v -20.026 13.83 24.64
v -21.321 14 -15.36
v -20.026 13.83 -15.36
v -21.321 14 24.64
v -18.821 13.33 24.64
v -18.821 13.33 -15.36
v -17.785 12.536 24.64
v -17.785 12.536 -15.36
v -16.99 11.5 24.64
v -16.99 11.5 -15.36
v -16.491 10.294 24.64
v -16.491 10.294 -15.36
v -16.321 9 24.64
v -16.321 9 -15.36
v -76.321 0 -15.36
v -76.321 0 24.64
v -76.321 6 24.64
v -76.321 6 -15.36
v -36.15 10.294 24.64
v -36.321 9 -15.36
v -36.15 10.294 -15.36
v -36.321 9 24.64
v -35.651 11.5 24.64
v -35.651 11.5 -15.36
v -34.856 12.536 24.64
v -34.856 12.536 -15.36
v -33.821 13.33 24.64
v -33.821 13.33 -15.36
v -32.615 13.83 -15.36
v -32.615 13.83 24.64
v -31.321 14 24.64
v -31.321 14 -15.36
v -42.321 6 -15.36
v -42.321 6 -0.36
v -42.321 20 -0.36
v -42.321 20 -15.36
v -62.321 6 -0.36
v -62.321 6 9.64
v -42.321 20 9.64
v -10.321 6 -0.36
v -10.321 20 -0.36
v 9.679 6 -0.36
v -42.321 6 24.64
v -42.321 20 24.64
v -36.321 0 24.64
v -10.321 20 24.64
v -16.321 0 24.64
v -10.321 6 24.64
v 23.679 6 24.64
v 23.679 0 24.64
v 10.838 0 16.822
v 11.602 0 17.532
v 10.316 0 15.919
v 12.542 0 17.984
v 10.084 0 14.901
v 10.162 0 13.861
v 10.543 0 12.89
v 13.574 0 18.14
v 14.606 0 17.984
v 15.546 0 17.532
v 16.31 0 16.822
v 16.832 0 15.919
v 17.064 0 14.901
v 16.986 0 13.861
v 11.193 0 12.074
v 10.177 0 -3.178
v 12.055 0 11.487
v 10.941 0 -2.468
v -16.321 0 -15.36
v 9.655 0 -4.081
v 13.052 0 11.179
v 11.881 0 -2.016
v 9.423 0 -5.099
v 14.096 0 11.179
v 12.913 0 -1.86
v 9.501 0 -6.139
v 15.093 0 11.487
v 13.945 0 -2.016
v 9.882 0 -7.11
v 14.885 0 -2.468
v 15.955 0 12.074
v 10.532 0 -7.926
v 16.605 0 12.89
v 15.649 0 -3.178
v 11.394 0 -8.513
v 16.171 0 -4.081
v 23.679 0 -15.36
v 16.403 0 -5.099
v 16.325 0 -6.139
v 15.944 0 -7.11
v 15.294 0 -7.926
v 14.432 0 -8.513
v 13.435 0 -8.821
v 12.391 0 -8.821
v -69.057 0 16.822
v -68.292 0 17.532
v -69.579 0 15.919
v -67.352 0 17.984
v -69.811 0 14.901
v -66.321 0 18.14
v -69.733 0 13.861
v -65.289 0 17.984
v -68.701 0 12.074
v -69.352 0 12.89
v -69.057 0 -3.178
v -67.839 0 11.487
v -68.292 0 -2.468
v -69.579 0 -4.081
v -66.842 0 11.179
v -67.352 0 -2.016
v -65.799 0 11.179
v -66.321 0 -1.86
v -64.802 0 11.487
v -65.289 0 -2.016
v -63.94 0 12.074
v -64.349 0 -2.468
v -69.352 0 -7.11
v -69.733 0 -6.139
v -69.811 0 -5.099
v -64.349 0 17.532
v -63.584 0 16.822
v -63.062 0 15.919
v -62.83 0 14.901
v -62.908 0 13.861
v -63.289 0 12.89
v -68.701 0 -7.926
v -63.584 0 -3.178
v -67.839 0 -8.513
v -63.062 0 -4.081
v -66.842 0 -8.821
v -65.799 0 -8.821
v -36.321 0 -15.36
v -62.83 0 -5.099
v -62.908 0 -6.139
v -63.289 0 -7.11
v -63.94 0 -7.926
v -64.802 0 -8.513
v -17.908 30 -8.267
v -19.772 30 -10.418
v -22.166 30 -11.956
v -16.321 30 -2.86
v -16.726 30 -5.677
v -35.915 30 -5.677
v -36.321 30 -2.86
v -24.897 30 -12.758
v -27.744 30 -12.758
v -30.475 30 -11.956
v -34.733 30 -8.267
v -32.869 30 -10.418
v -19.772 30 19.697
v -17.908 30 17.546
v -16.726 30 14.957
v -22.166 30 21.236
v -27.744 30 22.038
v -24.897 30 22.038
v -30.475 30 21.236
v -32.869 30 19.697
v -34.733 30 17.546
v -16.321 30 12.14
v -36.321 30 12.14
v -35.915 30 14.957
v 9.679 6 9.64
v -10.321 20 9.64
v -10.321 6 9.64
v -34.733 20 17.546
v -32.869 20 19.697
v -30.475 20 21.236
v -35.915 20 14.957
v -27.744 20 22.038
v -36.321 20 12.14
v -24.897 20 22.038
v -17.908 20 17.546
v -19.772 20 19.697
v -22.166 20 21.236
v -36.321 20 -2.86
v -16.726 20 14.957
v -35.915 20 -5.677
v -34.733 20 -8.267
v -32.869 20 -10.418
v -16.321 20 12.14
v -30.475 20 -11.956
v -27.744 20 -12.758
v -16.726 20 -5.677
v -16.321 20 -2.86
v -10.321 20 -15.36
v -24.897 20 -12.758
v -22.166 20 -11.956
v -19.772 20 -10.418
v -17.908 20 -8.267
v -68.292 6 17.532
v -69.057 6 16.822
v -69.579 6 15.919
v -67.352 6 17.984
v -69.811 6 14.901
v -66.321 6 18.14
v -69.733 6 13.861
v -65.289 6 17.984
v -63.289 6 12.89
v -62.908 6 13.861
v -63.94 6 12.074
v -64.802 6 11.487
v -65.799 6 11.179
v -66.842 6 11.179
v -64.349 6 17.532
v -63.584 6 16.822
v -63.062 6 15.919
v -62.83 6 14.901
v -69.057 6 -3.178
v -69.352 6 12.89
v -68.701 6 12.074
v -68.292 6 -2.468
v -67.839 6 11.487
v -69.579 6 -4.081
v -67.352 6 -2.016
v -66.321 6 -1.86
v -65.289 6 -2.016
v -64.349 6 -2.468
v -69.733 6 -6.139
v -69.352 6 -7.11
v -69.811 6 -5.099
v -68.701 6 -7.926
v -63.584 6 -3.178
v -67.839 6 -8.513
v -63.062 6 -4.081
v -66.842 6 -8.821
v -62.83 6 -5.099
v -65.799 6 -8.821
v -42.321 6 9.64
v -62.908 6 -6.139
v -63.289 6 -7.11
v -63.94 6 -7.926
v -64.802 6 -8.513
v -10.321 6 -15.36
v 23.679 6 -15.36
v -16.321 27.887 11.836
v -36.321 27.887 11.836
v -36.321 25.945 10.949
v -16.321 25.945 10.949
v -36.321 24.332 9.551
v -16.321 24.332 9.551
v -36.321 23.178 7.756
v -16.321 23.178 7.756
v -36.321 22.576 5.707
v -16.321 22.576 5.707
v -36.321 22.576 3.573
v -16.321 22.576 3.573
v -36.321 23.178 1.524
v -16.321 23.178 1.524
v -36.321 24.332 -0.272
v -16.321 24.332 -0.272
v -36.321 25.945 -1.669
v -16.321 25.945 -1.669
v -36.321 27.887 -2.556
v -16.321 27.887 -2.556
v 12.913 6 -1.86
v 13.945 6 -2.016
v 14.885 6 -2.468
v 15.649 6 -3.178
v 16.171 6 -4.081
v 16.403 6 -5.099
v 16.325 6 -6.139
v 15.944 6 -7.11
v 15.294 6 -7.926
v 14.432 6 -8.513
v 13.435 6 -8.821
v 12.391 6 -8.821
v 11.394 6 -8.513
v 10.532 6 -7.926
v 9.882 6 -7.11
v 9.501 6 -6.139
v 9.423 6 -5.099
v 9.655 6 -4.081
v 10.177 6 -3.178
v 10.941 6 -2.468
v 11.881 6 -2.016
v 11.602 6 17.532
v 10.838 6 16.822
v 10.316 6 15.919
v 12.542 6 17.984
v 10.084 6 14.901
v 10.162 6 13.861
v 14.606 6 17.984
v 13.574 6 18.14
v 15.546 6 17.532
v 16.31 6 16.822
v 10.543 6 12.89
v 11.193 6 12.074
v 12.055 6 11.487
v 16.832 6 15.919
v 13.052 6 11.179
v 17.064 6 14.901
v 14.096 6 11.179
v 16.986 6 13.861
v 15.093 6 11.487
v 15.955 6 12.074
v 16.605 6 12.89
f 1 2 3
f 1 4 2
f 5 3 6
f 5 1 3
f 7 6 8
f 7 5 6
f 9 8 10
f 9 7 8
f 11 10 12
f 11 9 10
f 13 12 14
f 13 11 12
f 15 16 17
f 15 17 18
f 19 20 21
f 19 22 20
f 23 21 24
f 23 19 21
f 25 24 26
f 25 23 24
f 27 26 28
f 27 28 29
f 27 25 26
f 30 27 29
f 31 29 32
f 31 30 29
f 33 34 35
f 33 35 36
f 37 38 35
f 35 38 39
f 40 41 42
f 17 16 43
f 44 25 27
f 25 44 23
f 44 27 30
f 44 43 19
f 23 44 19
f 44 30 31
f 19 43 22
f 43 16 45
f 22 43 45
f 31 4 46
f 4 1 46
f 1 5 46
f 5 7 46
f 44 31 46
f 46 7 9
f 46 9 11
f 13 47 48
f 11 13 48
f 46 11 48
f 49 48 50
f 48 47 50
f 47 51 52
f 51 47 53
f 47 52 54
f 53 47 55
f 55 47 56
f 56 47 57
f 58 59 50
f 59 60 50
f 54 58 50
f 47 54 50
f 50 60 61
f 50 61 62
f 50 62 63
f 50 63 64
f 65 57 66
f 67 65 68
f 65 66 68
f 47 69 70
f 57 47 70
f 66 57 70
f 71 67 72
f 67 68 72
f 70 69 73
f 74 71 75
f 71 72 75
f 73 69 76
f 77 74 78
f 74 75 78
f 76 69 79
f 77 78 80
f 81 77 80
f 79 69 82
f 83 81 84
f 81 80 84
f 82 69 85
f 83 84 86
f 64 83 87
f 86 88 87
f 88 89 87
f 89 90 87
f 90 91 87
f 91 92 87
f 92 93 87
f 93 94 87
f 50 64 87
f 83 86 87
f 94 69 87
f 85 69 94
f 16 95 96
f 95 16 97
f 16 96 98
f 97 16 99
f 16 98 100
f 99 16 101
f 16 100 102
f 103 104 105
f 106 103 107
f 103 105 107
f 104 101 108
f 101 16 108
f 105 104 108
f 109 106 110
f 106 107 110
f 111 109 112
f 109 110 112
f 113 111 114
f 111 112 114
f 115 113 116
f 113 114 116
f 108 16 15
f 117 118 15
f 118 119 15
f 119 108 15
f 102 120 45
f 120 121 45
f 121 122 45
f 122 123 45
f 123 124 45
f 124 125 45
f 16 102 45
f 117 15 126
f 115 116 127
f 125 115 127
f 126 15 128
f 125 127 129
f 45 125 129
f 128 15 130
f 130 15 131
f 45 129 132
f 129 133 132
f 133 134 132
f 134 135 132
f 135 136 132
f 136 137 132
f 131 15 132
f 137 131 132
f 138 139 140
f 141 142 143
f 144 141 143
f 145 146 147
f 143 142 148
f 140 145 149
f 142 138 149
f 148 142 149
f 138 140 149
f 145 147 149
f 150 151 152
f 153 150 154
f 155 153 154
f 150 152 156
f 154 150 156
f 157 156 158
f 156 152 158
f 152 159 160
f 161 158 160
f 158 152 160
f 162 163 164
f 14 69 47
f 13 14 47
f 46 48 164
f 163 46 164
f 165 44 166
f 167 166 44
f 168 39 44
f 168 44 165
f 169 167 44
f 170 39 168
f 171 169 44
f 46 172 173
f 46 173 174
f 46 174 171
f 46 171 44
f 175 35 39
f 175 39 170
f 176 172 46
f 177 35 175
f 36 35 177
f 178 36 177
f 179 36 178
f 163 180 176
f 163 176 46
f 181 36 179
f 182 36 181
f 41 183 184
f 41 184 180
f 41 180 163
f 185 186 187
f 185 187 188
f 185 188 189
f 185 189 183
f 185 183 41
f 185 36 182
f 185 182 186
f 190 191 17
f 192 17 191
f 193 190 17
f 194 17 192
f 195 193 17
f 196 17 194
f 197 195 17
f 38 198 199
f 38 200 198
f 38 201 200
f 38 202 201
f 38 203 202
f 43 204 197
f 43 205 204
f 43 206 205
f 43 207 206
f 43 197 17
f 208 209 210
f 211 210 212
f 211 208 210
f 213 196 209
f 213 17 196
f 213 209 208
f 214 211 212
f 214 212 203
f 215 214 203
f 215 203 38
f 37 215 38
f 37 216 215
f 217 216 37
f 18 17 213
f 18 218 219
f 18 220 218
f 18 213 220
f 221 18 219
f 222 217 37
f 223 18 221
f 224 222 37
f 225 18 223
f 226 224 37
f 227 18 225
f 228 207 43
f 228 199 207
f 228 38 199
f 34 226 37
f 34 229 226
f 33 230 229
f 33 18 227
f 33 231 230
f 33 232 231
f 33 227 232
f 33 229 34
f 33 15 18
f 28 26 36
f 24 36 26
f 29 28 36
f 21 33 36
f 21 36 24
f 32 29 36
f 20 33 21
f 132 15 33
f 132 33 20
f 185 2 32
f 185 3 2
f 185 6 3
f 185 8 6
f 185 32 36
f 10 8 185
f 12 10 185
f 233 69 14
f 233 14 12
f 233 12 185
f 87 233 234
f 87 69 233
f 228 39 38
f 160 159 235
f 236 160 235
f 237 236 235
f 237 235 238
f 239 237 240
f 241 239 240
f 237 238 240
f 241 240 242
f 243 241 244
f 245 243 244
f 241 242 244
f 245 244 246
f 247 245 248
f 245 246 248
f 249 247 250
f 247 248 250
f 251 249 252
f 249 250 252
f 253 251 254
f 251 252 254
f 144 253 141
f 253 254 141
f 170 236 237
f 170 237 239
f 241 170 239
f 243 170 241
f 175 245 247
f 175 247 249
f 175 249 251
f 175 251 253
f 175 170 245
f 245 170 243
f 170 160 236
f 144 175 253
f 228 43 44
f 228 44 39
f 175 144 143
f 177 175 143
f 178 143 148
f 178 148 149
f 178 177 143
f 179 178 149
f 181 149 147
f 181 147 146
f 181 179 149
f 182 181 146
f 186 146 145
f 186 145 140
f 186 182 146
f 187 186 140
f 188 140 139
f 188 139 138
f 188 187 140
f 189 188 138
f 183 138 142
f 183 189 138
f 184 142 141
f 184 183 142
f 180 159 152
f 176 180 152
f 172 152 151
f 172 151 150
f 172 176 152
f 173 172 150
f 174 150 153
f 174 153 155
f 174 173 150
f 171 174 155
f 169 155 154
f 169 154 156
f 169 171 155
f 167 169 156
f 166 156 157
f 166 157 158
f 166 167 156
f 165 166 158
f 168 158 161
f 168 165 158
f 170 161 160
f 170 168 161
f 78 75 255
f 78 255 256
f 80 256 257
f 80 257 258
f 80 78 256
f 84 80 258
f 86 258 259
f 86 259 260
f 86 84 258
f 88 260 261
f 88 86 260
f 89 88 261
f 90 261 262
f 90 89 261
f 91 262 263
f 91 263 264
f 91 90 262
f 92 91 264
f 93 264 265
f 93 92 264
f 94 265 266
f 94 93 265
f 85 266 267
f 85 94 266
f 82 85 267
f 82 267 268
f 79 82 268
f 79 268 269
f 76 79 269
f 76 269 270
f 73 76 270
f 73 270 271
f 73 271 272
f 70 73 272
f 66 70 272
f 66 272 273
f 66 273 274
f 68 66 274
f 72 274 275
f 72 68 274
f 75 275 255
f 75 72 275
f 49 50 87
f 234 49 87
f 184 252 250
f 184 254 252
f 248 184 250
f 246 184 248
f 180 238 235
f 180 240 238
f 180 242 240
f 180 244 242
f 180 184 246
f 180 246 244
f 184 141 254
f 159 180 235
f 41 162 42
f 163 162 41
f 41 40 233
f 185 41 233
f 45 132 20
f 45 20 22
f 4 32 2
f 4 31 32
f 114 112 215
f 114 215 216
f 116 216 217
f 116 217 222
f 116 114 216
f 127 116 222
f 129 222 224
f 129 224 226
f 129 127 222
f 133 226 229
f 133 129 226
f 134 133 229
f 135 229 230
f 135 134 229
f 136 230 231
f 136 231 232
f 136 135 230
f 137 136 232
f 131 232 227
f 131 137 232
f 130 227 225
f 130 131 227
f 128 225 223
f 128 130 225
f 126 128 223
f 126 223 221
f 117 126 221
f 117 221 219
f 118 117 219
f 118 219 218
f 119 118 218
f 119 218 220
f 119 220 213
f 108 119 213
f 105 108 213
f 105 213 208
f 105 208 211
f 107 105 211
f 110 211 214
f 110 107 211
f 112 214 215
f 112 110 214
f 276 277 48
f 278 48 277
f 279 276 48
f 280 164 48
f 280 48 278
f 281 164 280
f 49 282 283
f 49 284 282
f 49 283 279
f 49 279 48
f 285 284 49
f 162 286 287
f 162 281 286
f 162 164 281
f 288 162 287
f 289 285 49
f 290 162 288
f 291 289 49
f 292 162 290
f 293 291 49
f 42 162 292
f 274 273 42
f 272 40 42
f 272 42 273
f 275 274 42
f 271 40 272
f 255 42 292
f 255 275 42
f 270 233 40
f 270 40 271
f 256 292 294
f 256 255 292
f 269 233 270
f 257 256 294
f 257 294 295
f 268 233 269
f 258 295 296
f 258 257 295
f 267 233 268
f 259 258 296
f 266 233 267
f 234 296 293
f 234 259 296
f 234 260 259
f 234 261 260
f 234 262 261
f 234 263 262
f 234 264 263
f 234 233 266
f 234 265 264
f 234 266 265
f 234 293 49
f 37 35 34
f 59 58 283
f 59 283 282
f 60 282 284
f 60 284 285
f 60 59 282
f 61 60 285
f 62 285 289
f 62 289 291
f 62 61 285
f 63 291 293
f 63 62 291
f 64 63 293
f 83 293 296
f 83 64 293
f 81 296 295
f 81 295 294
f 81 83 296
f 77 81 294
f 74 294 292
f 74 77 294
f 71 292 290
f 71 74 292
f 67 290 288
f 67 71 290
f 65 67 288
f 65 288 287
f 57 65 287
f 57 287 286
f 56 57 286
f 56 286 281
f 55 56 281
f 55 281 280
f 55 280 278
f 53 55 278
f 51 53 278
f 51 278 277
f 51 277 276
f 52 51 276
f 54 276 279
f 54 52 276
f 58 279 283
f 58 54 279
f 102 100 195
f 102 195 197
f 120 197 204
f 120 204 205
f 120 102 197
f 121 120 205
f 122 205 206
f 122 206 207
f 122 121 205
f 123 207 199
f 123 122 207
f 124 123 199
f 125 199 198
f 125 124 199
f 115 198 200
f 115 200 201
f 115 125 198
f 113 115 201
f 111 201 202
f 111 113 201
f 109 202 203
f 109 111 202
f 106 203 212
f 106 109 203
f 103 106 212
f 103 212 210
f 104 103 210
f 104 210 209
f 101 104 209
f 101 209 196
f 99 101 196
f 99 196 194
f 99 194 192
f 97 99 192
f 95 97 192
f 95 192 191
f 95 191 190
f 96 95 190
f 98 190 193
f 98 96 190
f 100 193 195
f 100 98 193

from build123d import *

# Parameters (mm, degrees)
SKETCH1_W           = 100
SKETCH1_H           = 40
SKETCH1_R           = 3.5
BOSS_EXTRUDE1_DEPTH = 6
SKETCH2_W           = 32
SKETCH2_H           = 40
BOSS_EXTRUDE2_DEPTH = 14
SKETCH3_W           = 20
SKETCH3_H           = 40
CUT_EXTRUDE1_DEPTH  = 14
FILLET2_R           = 5
FILLET3_R           = 5
BOSS_EXTRUDE3_DEPTH = 10
BOSS_EXTRUDE4_DEPTH = 10
SKETCH8_R           = 7.5
CUT_EXTRUDE2_DEPTH  = 29


with BuildPart() as part:
    # Sketch1 → Boss-Extrude1 (new body)
    with BuildSketch(Plane(origin=(0, 0, 0), x_dir=(1, 0, 0), z_dir=(0, 1, 0))):
        with Locations((-26.320522258, -4.639903709)):
            Rectangle(SKETCH1_W, SKETCH1_H)
        with Locations(Location((-66.320522258, 5.360096291, 0), (0, 0, 270))):
            Circle(SKETCH1_R, mode=Mode.SUBTRACT)
        with Locations(Location((-66.320522258, -14.639903709, 0), (0, 0, 270))):
            Circle(SKETCH1_R, mode=Mode.SUBTRACT)
        with Locations(Location((12.912927844, 5.360096291, 0), (0, 0, 270))):
            Circle(SKETCH1_R, mode=Mode.SUBTRACT)
        with Locations(Location((13.573914865, -14.639903709, 0), (0, 0, 270))):
            Circle(SKETCH1_R, mode=Mode.SUBTRACT)
    extrude(amount=BOSS_EXTRUDE1_DEPTH)

    # Sketch2 → Boss-Extrude2 (add)
    with BuildSketch(Plane(origin=(0, 6, 0), x_dir=(1, 0, 0), z_dir=(0, 1, 0))):
        with Locations((-26.320522258, -4.639903709)):
            Rectangle(SKETCH2_W, SKETCH2_H)
    extrude(amount=BOSS_EXTRUDE2_DEPTH)

    # Sketch3 → Cut-Extrude1 (cut)
    with BuildSketch(Plane.XZ):
        with Locations((-26.320522258, 4.639903709)):
            Rectangle(SKETCH3_W, SKETCH3_H)
    extrude(amount=-CUT_EXTRUDE1_DEPTH, mode=Mode.SUBTRACT)

    # Fillet2
    fillet2_edges = [part.edges().sort_by_distance(p)[0] for p in [
        (-36.320522258, 14, 4.639903709),
    ]]
    fillet(fillet2_edges, radius=FILLET2_R)

    # Fillet3
    fillet3_edges = [part.edges().sort_by_distance(p)[0] for p in [
        (-16.320522258, 14, 4.639903709),
    ]]
    fillet(fillet3_edges, radius=FILLET3_R)

    # Sketch6 → Boss-Extrude3 (add)
    with BuildSketch(Plane.XY.offset(9.639903709)):
        Polygon((-10.320522258, 6), (9.679477742, 6), (-10.320522258, 20), align=None)
        Polygon((-42.320522258, 6), (-62.320522258, 6), (-42.320522258, 20), align=None)
    extrude(amount=-BOSS_EXTRUDE3_DEPTH)

    # Sketch7 → Boss-Extrude4 (add)
    with BuildSketch(Plane(origin=(0, 20, 0), x_dir=(1, 0, 0), z_dir=(0, 1, 0))):
        with BuildLine():
            Line((-16.320522258, 2.860096291), (-16.320522258, -12.139903709))
            ThreePointArc((-16.320522258, -12.139903709), (-26.320522258, -22.139903709), (-36.320522258, -12.139903709))
            Line((-36.320522258, -12.139903709), (-36.320522258, 2.860096291))
            ThreePointArc((-36.320522258, 2.860096291), (-26.320522258, 12.860096291), (-16.320522258, 2.860096291))
        make_face()
    extrude(amount=BOSS_EXTRUDE4_DEPTH)

    # Sketch8 → Cut-Extrude2 (cut)
    with BuildSketch(Plane(origin=(-16.320522258, 0, 0), x_dir=(0, 0, -1), z_dir=(1, 0, 0))):
        with Locations((-4.639903709, 30)):
            Circle(SKETCH8_R)
    extrude(amount=-CUT_EXTRUDE2_DEPTH, mode=Mode.SUBTRACT)


solid = part.part
